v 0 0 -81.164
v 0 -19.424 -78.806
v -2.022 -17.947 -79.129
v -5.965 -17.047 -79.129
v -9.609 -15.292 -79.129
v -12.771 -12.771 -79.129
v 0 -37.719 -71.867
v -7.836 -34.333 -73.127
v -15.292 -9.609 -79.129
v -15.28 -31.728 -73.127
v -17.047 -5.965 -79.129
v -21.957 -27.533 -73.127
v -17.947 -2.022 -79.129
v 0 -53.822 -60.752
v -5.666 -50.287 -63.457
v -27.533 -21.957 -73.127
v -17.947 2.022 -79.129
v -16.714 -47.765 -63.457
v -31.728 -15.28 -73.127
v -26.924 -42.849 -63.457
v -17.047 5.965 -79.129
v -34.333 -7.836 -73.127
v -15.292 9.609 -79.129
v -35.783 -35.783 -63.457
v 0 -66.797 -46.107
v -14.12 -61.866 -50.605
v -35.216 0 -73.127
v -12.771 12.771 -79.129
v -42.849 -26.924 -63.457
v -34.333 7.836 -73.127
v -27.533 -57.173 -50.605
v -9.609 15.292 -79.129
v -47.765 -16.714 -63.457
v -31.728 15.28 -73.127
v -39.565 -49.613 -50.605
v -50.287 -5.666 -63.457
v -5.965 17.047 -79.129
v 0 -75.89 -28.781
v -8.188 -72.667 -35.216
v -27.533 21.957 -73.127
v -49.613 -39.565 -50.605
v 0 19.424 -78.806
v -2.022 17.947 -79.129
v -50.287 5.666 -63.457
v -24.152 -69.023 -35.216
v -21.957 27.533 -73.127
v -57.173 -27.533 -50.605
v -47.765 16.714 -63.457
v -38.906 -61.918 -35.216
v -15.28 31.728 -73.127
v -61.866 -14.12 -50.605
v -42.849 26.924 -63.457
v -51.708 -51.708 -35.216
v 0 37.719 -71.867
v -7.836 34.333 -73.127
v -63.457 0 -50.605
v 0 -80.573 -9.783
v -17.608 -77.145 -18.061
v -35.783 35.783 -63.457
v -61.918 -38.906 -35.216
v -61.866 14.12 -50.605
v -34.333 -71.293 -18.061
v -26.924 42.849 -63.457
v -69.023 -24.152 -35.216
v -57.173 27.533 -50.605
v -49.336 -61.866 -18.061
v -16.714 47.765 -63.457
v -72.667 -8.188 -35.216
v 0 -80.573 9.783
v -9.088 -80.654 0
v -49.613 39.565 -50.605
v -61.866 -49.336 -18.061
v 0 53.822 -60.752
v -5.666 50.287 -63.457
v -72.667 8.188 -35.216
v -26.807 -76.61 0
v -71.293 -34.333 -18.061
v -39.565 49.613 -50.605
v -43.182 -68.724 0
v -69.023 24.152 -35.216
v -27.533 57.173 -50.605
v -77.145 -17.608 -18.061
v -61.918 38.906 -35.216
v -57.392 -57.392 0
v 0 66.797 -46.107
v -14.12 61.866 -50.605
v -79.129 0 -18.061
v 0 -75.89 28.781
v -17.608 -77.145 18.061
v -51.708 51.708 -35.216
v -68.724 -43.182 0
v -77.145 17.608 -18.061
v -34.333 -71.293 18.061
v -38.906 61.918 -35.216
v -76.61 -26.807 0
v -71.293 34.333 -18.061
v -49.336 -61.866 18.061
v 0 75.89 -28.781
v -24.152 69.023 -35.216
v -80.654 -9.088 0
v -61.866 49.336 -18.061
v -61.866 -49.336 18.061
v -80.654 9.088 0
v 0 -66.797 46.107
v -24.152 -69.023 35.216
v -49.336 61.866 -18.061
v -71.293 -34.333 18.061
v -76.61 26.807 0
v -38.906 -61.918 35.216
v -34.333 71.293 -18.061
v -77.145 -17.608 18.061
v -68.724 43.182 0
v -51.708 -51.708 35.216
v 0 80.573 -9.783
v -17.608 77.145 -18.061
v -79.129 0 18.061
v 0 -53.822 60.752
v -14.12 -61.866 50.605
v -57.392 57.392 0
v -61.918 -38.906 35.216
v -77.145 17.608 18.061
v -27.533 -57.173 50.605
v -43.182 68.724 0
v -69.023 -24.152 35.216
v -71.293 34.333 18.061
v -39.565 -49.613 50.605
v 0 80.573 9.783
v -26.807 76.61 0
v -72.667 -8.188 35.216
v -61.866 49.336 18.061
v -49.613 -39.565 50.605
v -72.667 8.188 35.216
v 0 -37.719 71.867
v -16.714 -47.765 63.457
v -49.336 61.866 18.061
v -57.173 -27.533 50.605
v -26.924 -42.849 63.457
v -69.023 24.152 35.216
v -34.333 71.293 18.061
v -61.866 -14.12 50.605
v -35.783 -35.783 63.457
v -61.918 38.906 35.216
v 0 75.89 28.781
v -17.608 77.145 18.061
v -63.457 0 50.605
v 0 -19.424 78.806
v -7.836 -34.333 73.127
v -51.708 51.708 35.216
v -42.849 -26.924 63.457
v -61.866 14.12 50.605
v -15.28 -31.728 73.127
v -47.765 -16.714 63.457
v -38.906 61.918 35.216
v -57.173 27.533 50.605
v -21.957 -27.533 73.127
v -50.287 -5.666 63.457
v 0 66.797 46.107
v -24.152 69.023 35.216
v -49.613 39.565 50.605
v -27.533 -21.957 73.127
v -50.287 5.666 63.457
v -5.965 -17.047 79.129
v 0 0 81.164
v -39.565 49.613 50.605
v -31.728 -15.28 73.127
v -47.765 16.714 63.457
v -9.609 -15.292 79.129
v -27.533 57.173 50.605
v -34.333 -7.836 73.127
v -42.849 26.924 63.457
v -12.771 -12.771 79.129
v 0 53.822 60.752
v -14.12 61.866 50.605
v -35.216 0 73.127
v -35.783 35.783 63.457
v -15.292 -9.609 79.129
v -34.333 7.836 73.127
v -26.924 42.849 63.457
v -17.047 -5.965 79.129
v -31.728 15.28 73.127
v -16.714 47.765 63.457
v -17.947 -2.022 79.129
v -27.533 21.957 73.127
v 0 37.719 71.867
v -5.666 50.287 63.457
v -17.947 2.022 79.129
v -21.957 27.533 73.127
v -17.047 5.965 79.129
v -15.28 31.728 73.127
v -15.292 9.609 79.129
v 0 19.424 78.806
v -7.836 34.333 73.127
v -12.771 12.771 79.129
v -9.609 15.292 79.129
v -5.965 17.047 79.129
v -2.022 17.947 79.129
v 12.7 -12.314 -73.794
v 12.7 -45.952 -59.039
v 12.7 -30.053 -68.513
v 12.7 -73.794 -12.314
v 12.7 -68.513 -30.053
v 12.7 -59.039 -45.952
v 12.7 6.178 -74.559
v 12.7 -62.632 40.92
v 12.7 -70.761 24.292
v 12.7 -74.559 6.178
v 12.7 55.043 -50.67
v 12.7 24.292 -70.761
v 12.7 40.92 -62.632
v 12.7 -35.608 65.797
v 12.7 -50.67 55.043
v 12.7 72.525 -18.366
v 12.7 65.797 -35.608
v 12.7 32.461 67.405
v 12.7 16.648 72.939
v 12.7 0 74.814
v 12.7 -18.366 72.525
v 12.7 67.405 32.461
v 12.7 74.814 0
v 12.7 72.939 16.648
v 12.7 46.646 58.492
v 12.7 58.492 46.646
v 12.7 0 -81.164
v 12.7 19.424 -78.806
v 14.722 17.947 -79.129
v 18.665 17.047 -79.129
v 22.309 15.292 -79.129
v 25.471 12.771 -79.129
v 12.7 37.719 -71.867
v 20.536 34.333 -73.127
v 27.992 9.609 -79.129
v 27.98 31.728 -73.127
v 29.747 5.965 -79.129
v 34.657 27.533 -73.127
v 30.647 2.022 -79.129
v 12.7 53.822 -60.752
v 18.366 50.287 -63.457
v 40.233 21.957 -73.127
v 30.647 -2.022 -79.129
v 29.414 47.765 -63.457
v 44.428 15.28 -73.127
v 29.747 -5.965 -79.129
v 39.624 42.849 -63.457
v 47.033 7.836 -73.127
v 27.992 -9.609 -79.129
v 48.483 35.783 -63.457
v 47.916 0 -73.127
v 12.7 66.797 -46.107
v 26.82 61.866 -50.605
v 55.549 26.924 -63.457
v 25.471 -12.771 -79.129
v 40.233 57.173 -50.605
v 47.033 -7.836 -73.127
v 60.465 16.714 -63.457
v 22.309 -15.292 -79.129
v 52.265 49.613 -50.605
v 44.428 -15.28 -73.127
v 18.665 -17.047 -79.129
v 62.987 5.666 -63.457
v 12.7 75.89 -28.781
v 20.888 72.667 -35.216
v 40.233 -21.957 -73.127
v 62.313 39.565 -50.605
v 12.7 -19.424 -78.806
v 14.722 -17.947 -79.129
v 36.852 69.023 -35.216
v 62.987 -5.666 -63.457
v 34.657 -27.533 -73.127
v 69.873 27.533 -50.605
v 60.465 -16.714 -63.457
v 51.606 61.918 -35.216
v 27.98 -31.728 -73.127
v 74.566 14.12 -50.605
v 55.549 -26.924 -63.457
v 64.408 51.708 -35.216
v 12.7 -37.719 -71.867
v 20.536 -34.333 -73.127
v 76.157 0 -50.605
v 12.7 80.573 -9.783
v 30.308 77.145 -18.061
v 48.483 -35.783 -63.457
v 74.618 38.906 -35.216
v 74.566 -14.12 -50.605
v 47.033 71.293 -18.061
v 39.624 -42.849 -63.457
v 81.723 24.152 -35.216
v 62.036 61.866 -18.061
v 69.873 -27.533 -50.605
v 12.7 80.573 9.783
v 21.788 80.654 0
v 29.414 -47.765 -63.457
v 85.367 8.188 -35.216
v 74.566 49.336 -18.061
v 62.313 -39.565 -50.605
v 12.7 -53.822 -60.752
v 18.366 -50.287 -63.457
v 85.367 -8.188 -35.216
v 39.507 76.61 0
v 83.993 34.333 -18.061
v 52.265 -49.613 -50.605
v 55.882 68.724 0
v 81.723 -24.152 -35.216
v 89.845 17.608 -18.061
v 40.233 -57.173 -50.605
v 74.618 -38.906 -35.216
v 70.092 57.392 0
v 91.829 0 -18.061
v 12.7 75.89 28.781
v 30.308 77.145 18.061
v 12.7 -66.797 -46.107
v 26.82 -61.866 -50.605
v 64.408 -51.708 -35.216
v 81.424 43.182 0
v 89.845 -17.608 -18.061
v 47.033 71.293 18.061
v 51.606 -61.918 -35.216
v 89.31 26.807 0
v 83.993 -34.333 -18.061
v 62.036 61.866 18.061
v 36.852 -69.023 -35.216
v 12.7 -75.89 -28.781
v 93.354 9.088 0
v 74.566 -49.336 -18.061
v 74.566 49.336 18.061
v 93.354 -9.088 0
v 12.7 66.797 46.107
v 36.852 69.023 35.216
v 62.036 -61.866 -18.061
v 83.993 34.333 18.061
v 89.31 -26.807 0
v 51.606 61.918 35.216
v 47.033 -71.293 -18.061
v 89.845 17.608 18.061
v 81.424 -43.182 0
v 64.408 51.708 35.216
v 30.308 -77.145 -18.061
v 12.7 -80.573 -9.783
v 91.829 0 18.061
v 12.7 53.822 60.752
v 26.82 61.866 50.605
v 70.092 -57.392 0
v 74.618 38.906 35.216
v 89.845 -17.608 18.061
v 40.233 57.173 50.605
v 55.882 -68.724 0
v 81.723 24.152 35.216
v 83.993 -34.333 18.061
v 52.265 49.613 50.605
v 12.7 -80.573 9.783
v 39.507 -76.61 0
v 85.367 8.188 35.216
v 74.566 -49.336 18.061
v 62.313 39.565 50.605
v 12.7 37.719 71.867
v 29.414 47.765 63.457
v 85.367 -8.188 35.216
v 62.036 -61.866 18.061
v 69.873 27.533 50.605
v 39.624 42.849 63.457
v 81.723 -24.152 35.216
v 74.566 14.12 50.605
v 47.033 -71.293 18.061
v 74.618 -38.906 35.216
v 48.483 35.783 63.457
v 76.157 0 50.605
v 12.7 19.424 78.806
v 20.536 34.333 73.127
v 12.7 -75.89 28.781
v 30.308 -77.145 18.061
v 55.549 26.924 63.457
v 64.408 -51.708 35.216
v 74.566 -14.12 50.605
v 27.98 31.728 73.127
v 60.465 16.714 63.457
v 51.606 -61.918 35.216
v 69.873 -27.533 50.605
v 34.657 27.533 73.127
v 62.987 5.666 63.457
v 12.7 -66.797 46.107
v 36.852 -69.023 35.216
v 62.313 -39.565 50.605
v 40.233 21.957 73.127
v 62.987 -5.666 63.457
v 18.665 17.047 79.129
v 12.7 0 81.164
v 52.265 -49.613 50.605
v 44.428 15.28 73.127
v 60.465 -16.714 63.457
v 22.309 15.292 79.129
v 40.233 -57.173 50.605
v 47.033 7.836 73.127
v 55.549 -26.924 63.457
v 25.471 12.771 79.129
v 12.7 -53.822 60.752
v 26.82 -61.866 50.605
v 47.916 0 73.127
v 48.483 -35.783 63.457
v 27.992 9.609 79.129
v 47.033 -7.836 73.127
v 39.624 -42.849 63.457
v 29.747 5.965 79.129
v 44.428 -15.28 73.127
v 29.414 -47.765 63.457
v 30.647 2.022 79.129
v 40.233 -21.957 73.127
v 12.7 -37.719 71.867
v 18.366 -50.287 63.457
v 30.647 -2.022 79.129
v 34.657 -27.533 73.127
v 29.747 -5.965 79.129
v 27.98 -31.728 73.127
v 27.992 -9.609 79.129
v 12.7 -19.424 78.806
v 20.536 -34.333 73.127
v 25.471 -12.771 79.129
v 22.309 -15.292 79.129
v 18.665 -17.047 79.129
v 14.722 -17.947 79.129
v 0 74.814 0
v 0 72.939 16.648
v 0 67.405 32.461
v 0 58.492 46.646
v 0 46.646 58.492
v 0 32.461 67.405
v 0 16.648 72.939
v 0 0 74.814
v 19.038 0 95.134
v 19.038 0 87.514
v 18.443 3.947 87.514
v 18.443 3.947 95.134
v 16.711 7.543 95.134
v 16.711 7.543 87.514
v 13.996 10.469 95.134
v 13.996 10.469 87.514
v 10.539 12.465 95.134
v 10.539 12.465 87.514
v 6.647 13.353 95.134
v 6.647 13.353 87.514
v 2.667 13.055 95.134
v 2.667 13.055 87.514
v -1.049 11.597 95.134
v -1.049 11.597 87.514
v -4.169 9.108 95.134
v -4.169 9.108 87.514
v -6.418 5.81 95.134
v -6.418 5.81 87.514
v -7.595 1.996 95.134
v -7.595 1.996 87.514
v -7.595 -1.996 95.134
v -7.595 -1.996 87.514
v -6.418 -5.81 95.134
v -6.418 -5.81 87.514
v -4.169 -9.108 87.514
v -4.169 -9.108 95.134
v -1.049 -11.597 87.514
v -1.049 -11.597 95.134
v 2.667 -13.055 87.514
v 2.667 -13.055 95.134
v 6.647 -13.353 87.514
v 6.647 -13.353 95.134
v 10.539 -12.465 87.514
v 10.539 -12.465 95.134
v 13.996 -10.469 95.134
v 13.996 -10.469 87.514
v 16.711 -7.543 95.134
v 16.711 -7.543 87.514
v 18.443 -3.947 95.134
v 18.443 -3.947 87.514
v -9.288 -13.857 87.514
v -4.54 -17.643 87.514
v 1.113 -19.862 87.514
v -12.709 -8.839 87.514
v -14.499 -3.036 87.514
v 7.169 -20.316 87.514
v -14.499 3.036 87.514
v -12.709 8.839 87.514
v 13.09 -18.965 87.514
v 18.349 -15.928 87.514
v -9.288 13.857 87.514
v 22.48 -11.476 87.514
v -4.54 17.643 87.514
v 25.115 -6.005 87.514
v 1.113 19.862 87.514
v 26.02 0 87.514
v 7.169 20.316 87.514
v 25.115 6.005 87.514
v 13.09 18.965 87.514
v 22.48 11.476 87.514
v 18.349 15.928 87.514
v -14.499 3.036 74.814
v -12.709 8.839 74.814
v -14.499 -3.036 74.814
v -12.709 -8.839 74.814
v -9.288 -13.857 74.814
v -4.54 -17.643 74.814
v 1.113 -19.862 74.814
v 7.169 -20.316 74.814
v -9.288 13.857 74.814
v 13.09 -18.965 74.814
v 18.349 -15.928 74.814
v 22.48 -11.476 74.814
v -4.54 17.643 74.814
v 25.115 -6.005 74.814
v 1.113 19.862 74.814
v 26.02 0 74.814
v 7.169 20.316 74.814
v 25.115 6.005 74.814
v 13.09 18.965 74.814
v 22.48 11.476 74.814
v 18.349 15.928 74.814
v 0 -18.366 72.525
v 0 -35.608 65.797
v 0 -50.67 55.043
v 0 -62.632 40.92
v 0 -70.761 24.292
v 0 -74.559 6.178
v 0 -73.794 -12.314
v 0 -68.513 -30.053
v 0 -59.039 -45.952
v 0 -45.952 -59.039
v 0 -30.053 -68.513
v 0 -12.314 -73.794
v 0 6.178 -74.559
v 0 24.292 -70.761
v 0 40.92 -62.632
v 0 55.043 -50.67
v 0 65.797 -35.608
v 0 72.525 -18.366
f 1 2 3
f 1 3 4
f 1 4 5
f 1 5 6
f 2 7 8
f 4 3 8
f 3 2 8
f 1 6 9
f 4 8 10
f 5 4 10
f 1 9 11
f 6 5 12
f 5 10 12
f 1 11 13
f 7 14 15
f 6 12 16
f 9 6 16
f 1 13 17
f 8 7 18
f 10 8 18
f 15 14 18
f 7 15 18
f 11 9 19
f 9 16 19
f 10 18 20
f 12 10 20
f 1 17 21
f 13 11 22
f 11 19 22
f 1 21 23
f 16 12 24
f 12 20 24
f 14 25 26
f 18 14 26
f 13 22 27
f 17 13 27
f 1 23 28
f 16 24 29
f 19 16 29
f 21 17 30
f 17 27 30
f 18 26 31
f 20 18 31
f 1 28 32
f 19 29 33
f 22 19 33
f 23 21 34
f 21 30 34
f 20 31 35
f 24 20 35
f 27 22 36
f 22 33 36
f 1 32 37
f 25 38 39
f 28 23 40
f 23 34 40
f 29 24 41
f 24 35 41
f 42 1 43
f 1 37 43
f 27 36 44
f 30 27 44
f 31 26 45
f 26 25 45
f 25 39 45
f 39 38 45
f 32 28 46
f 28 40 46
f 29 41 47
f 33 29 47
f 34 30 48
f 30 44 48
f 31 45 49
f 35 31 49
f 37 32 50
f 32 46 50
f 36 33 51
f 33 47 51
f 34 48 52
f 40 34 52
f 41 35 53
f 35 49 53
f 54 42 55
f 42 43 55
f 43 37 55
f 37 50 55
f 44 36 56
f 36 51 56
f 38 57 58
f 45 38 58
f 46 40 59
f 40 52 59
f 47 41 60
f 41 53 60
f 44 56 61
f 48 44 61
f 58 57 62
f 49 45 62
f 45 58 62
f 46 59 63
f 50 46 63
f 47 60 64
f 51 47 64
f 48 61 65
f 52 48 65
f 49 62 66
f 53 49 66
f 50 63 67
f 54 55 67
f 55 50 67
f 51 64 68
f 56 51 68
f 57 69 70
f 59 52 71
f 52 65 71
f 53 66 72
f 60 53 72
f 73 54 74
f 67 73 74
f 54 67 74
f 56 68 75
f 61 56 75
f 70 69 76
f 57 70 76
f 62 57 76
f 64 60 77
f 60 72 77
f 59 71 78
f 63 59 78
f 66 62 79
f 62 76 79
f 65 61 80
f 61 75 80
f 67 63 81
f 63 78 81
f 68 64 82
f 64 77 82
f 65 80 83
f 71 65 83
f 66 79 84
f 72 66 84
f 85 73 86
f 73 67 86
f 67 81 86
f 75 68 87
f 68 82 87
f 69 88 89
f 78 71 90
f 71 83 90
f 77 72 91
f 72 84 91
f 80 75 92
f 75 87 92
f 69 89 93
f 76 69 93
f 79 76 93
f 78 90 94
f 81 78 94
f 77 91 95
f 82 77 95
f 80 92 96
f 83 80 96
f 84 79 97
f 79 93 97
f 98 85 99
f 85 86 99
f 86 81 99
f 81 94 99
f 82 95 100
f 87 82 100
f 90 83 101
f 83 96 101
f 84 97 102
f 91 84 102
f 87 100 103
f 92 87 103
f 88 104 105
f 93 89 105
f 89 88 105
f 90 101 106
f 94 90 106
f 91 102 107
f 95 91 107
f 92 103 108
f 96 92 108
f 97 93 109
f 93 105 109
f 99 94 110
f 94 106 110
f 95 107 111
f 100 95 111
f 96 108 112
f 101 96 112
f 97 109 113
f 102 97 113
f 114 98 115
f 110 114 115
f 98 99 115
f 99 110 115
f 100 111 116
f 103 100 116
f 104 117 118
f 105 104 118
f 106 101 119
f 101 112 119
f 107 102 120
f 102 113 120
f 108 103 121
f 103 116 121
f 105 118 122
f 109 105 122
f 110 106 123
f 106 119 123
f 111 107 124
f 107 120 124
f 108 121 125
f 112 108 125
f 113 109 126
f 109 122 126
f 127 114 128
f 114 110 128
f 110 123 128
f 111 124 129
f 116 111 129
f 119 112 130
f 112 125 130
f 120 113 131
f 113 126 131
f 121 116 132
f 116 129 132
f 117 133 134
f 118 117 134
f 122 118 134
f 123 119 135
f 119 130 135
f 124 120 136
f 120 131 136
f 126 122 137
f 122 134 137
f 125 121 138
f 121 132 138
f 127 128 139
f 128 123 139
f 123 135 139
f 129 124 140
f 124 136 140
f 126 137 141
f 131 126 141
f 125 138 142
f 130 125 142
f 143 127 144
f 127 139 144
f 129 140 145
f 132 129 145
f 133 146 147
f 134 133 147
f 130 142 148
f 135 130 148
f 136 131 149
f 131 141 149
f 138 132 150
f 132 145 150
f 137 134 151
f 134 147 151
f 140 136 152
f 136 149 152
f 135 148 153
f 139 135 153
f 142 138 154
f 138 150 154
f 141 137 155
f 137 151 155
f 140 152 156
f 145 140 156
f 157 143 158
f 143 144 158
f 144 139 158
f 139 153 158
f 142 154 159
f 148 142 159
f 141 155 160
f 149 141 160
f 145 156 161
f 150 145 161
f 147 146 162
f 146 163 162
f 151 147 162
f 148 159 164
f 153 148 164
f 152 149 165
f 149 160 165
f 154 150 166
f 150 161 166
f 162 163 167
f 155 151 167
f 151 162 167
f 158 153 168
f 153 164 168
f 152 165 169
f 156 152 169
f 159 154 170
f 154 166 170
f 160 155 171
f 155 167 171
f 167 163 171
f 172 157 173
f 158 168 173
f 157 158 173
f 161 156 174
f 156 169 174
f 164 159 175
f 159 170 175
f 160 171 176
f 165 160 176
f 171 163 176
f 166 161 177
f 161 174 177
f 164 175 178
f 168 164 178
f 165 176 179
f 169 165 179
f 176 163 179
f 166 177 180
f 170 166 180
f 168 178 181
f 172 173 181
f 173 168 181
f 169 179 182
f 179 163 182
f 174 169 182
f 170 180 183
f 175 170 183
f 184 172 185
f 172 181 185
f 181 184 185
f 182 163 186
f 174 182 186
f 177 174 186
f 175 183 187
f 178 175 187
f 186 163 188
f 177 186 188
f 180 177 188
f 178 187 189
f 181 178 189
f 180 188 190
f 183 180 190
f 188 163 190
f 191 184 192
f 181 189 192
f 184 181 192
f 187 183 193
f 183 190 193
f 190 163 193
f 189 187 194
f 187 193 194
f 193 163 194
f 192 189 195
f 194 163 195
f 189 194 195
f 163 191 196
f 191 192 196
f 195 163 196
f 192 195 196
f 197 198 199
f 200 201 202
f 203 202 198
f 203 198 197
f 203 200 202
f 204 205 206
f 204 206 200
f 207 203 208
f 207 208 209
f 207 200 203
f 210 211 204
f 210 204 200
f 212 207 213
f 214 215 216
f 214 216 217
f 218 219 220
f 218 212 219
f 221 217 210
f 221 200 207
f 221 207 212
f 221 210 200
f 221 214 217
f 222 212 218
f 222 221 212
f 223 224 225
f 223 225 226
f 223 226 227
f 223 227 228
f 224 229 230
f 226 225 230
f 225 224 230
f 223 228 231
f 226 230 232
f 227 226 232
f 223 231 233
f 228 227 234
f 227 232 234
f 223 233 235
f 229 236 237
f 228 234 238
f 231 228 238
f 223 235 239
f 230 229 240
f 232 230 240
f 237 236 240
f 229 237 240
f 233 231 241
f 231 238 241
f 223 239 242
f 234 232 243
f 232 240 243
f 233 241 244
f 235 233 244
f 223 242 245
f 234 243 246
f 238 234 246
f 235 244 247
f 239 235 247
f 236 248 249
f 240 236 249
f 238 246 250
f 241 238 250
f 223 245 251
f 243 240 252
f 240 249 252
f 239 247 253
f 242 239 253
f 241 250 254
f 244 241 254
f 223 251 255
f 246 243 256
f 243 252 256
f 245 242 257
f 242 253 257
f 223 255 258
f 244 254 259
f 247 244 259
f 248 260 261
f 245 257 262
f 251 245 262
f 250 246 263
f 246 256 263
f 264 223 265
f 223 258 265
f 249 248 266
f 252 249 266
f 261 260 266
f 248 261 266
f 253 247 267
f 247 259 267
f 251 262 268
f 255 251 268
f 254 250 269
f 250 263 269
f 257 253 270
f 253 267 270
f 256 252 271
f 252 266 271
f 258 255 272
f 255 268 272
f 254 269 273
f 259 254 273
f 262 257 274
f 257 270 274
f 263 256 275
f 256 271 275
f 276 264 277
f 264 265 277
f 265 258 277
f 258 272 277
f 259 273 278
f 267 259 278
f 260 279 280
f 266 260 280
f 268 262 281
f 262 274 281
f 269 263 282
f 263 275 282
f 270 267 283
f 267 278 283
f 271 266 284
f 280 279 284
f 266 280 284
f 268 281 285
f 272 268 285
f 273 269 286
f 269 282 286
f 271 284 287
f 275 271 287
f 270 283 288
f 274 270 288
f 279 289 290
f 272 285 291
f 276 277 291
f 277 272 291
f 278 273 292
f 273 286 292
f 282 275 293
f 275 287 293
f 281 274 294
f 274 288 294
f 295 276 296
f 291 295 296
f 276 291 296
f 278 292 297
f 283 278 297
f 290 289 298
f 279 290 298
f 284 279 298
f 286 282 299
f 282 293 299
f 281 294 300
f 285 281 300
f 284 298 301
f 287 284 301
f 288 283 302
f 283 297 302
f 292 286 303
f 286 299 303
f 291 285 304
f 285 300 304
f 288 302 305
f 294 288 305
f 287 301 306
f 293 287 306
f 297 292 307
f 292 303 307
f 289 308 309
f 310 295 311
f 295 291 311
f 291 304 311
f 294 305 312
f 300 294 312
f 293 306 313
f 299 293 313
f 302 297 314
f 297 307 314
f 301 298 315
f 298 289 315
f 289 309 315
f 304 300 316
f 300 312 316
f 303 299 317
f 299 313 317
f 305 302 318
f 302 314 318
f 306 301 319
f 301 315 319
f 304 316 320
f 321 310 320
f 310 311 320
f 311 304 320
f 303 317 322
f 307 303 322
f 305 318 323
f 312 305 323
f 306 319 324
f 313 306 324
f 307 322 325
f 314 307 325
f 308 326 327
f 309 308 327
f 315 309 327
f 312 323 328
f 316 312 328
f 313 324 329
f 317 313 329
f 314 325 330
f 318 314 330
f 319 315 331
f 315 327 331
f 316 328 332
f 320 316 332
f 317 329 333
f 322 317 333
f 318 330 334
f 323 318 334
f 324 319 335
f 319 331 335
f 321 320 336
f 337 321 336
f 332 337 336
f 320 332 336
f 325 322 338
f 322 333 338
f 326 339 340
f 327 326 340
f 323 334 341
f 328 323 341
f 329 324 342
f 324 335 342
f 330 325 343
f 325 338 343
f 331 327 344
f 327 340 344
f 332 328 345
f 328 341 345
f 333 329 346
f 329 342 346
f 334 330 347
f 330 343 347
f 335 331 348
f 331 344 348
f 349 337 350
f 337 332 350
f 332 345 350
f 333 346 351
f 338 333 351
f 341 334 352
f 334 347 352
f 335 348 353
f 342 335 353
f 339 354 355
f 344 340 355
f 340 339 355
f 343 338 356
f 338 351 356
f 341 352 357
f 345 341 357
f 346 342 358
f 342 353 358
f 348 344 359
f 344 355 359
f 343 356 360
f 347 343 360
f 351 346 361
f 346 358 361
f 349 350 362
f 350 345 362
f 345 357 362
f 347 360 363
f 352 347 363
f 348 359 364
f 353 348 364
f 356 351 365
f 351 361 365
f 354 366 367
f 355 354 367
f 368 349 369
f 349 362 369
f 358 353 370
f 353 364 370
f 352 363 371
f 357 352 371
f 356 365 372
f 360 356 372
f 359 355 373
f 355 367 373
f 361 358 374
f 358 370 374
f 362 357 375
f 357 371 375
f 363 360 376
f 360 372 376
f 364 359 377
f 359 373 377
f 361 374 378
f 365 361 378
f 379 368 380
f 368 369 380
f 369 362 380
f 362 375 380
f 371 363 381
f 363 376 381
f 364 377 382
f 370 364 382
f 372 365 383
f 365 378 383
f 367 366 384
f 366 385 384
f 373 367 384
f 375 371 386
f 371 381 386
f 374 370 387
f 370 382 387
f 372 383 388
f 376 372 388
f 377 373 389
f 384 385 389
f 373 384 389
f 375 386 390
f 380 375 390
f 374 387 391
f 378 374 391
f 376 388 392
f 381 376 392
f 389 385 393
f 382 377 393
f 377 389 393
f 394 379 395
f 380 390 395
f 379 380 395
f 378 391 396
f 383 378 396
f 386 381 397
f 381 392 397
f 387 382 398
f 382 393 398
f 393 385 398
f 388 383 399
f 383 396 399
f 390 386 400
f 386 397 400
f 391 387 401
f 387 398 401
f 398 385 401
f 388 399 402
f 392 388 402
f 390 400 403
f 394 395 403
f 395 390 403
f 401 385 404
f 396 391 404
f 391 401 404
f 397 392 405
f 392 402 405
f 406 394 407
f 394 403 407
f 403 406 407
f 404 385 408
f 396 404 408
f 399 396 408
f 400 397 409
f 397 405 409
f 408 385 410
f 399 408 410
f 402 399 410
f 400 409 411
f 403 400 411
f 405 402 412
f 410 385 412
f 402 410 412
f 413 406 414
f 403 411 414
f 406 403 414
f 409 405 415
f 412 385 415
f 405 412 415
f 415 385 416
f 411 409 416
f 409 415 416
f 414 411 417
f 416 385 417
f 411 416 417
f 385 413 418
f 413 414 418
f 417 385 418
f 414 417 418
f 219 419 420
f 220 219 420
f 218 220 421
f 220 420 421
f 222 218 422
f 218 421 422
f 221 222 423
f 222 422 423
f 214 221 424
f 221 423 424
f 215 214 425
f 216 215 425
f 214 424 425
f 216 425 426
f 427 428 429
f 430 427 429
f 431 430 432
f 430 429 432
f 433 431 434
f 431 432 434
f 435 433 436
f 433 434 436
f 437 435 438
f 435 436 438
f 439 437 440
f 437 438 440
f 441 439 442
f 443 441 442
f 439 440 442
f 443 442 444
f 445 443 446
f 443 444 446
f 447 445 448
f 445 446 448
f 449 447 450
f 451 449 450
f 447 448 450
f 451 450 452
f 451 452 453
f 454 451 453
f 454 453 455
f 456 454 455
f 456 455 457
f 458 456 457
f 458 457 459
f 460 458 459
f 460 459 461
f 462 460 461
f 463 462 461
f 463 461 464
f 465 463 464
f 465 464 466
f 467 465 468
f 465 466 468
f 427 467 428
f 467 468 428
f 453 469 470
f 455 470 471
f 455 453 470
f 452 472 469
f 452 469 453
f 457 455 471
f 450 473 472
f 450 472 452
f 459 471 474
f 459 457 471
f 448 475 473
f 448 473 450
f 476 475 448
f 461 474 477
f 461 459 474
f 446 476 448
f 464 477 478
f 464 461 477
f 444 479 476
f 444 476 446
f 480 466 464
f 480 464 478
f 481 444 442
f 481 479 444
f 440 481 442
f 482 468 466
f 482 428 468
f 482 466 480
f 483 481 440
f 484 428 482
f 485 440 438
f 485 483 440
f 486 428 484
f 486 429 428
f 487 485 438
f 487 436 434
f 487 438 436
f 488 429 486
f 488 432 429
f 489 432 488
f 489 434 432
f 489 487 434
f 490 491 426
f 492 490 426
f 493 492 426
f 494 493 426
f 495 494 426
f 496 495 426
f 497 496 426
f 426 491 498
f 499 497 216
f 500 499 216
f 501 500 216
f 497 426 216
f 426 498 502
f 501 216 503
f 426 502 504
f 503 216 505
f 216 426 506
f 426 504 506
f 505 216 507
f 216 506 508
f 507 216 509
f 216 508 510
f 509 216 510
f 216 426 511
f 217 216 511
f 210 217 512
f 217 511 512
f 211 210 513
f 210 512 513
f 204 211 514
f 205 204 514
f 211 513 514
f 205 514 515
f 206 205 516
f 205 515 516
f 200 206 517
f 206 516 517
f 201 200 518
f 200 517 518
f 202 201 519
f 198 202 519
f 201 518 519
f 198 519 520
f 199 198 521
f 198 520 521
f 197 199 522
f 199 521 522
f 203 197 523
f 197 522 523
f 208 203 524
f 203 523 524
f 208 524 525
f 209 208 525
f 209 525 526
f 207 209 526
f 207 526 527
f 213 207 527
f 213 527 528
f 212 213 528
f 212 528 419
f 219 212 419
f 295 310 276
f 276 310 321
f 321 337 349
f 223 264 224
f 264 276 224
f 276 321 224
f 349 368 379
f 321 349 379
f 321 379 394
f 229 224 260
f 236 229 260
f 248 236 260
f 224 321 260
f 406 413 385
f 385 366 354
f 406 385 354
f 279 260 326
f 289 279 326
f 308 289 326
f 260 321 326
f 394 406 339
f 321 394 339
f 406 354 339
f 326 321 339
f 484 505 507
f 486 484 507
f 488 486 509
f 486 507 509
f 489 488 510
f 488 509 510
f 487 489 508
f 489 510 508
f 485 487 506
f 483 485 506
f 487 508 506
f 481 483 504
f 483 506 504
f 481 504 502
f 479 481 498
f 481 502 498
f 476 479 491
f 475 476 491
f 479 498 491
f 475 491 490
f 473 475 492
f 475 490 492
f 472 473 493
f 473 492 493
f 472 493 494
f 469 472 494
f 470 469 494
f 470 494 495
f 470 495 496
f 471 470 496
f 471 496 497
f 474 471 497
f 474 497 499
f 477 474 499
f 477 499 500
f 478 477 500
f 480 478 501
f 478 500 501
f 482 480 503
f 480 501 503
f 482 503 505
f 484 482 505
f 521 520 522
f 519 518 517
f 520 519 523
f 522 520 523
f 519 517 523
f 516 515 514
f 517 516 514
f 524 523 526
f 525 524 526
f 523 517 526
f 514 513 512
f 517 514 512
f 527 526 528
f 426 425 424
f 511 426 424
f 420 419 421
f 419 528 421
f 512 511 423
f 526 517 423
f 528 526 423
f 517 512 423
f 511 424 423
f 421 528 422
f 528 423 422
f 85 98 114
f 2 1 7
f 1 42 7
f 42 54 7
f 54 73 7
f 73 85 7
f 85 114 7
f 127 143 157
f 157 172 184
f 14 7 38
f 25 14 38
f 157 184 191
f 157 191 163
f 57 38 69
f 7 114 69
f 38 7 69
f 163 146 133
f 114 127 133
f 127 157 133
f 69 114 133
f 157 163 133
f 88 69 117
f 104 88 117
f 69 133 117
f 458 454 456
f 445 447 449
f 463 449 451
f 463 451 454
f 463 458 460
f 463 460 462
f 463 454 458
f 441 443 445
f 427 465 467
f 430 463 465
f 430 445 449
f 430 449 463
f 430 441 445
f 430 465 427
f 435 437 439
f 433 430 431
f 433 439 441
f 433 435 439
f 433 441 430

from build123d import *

# Parameters (mm, degrees)
F0_R      = 74.814367
F1_DEPTH  = 12.7
F4_R      = 20.372957
F5_DEPTH  = 12.7
F6_R      = 13.390931
F7_DEPTH  = 7.62
F10_ANGLE = 180
F12_ANGLE = 180


with BuildPart() as f1:
    # F0 (on Right) → F1 (new body)
    with BuildSketch(Plane.YZ):
        Circle(F0_R)
    extrude(amount=F1_DEPTH)

    # F4 (on plane+point) → F5 (join)
    with BuildSketch(Plane.XY.offset(74.814367)):
        with Locations((5.646787, 0)):
            Circle(F4_R)
    extrude(amount=F5_DEPTH)

    # F6 (on face) → F7 (join)
    with BuildSketch(Plane.XY.offset(87.514367)):
        with Locations((5.646787, 0)):
            Circle(F6_R)
    extrude(amount=F7_DEPTH)


with BuildPart() as f10:
    # F9 (on face) → F10 (revolve)
    with BuildSketch(Plane.YZ.offset(12.7)):
        with BuildLine():
            ThreePointArc((0, -81.164367), (81.164367, 0), (0, 81.164367))
            Line((0, 81.164367), (0, -81.164367))
        make_face()
    revolve(axis=Axis((12.7, 0, 0), (0, 0, -1)), revolution_arc=F10_ANGLE)


with BuildPart() as f12:
    # F11 (on face) → F12 (revolve)
    with BuildSketch(Plane(origin=(0, 0, 0), x_dir=(0, -1, 0), z_dir=(-1, 0, 0))):
        with BuildLine():
            Line((0, 81.164367), (0, -81.164367))
            ThreePointArc((0, -81.164367), (81.164367, 0), (0, 81.164367))
        make_face()
    revolve(axis=Axis((0, 0, 0), (0, 0, -1)), revolution_arc=F12_ANGLE)


solid = Compound([f1.part, f10.part, f12.part])
